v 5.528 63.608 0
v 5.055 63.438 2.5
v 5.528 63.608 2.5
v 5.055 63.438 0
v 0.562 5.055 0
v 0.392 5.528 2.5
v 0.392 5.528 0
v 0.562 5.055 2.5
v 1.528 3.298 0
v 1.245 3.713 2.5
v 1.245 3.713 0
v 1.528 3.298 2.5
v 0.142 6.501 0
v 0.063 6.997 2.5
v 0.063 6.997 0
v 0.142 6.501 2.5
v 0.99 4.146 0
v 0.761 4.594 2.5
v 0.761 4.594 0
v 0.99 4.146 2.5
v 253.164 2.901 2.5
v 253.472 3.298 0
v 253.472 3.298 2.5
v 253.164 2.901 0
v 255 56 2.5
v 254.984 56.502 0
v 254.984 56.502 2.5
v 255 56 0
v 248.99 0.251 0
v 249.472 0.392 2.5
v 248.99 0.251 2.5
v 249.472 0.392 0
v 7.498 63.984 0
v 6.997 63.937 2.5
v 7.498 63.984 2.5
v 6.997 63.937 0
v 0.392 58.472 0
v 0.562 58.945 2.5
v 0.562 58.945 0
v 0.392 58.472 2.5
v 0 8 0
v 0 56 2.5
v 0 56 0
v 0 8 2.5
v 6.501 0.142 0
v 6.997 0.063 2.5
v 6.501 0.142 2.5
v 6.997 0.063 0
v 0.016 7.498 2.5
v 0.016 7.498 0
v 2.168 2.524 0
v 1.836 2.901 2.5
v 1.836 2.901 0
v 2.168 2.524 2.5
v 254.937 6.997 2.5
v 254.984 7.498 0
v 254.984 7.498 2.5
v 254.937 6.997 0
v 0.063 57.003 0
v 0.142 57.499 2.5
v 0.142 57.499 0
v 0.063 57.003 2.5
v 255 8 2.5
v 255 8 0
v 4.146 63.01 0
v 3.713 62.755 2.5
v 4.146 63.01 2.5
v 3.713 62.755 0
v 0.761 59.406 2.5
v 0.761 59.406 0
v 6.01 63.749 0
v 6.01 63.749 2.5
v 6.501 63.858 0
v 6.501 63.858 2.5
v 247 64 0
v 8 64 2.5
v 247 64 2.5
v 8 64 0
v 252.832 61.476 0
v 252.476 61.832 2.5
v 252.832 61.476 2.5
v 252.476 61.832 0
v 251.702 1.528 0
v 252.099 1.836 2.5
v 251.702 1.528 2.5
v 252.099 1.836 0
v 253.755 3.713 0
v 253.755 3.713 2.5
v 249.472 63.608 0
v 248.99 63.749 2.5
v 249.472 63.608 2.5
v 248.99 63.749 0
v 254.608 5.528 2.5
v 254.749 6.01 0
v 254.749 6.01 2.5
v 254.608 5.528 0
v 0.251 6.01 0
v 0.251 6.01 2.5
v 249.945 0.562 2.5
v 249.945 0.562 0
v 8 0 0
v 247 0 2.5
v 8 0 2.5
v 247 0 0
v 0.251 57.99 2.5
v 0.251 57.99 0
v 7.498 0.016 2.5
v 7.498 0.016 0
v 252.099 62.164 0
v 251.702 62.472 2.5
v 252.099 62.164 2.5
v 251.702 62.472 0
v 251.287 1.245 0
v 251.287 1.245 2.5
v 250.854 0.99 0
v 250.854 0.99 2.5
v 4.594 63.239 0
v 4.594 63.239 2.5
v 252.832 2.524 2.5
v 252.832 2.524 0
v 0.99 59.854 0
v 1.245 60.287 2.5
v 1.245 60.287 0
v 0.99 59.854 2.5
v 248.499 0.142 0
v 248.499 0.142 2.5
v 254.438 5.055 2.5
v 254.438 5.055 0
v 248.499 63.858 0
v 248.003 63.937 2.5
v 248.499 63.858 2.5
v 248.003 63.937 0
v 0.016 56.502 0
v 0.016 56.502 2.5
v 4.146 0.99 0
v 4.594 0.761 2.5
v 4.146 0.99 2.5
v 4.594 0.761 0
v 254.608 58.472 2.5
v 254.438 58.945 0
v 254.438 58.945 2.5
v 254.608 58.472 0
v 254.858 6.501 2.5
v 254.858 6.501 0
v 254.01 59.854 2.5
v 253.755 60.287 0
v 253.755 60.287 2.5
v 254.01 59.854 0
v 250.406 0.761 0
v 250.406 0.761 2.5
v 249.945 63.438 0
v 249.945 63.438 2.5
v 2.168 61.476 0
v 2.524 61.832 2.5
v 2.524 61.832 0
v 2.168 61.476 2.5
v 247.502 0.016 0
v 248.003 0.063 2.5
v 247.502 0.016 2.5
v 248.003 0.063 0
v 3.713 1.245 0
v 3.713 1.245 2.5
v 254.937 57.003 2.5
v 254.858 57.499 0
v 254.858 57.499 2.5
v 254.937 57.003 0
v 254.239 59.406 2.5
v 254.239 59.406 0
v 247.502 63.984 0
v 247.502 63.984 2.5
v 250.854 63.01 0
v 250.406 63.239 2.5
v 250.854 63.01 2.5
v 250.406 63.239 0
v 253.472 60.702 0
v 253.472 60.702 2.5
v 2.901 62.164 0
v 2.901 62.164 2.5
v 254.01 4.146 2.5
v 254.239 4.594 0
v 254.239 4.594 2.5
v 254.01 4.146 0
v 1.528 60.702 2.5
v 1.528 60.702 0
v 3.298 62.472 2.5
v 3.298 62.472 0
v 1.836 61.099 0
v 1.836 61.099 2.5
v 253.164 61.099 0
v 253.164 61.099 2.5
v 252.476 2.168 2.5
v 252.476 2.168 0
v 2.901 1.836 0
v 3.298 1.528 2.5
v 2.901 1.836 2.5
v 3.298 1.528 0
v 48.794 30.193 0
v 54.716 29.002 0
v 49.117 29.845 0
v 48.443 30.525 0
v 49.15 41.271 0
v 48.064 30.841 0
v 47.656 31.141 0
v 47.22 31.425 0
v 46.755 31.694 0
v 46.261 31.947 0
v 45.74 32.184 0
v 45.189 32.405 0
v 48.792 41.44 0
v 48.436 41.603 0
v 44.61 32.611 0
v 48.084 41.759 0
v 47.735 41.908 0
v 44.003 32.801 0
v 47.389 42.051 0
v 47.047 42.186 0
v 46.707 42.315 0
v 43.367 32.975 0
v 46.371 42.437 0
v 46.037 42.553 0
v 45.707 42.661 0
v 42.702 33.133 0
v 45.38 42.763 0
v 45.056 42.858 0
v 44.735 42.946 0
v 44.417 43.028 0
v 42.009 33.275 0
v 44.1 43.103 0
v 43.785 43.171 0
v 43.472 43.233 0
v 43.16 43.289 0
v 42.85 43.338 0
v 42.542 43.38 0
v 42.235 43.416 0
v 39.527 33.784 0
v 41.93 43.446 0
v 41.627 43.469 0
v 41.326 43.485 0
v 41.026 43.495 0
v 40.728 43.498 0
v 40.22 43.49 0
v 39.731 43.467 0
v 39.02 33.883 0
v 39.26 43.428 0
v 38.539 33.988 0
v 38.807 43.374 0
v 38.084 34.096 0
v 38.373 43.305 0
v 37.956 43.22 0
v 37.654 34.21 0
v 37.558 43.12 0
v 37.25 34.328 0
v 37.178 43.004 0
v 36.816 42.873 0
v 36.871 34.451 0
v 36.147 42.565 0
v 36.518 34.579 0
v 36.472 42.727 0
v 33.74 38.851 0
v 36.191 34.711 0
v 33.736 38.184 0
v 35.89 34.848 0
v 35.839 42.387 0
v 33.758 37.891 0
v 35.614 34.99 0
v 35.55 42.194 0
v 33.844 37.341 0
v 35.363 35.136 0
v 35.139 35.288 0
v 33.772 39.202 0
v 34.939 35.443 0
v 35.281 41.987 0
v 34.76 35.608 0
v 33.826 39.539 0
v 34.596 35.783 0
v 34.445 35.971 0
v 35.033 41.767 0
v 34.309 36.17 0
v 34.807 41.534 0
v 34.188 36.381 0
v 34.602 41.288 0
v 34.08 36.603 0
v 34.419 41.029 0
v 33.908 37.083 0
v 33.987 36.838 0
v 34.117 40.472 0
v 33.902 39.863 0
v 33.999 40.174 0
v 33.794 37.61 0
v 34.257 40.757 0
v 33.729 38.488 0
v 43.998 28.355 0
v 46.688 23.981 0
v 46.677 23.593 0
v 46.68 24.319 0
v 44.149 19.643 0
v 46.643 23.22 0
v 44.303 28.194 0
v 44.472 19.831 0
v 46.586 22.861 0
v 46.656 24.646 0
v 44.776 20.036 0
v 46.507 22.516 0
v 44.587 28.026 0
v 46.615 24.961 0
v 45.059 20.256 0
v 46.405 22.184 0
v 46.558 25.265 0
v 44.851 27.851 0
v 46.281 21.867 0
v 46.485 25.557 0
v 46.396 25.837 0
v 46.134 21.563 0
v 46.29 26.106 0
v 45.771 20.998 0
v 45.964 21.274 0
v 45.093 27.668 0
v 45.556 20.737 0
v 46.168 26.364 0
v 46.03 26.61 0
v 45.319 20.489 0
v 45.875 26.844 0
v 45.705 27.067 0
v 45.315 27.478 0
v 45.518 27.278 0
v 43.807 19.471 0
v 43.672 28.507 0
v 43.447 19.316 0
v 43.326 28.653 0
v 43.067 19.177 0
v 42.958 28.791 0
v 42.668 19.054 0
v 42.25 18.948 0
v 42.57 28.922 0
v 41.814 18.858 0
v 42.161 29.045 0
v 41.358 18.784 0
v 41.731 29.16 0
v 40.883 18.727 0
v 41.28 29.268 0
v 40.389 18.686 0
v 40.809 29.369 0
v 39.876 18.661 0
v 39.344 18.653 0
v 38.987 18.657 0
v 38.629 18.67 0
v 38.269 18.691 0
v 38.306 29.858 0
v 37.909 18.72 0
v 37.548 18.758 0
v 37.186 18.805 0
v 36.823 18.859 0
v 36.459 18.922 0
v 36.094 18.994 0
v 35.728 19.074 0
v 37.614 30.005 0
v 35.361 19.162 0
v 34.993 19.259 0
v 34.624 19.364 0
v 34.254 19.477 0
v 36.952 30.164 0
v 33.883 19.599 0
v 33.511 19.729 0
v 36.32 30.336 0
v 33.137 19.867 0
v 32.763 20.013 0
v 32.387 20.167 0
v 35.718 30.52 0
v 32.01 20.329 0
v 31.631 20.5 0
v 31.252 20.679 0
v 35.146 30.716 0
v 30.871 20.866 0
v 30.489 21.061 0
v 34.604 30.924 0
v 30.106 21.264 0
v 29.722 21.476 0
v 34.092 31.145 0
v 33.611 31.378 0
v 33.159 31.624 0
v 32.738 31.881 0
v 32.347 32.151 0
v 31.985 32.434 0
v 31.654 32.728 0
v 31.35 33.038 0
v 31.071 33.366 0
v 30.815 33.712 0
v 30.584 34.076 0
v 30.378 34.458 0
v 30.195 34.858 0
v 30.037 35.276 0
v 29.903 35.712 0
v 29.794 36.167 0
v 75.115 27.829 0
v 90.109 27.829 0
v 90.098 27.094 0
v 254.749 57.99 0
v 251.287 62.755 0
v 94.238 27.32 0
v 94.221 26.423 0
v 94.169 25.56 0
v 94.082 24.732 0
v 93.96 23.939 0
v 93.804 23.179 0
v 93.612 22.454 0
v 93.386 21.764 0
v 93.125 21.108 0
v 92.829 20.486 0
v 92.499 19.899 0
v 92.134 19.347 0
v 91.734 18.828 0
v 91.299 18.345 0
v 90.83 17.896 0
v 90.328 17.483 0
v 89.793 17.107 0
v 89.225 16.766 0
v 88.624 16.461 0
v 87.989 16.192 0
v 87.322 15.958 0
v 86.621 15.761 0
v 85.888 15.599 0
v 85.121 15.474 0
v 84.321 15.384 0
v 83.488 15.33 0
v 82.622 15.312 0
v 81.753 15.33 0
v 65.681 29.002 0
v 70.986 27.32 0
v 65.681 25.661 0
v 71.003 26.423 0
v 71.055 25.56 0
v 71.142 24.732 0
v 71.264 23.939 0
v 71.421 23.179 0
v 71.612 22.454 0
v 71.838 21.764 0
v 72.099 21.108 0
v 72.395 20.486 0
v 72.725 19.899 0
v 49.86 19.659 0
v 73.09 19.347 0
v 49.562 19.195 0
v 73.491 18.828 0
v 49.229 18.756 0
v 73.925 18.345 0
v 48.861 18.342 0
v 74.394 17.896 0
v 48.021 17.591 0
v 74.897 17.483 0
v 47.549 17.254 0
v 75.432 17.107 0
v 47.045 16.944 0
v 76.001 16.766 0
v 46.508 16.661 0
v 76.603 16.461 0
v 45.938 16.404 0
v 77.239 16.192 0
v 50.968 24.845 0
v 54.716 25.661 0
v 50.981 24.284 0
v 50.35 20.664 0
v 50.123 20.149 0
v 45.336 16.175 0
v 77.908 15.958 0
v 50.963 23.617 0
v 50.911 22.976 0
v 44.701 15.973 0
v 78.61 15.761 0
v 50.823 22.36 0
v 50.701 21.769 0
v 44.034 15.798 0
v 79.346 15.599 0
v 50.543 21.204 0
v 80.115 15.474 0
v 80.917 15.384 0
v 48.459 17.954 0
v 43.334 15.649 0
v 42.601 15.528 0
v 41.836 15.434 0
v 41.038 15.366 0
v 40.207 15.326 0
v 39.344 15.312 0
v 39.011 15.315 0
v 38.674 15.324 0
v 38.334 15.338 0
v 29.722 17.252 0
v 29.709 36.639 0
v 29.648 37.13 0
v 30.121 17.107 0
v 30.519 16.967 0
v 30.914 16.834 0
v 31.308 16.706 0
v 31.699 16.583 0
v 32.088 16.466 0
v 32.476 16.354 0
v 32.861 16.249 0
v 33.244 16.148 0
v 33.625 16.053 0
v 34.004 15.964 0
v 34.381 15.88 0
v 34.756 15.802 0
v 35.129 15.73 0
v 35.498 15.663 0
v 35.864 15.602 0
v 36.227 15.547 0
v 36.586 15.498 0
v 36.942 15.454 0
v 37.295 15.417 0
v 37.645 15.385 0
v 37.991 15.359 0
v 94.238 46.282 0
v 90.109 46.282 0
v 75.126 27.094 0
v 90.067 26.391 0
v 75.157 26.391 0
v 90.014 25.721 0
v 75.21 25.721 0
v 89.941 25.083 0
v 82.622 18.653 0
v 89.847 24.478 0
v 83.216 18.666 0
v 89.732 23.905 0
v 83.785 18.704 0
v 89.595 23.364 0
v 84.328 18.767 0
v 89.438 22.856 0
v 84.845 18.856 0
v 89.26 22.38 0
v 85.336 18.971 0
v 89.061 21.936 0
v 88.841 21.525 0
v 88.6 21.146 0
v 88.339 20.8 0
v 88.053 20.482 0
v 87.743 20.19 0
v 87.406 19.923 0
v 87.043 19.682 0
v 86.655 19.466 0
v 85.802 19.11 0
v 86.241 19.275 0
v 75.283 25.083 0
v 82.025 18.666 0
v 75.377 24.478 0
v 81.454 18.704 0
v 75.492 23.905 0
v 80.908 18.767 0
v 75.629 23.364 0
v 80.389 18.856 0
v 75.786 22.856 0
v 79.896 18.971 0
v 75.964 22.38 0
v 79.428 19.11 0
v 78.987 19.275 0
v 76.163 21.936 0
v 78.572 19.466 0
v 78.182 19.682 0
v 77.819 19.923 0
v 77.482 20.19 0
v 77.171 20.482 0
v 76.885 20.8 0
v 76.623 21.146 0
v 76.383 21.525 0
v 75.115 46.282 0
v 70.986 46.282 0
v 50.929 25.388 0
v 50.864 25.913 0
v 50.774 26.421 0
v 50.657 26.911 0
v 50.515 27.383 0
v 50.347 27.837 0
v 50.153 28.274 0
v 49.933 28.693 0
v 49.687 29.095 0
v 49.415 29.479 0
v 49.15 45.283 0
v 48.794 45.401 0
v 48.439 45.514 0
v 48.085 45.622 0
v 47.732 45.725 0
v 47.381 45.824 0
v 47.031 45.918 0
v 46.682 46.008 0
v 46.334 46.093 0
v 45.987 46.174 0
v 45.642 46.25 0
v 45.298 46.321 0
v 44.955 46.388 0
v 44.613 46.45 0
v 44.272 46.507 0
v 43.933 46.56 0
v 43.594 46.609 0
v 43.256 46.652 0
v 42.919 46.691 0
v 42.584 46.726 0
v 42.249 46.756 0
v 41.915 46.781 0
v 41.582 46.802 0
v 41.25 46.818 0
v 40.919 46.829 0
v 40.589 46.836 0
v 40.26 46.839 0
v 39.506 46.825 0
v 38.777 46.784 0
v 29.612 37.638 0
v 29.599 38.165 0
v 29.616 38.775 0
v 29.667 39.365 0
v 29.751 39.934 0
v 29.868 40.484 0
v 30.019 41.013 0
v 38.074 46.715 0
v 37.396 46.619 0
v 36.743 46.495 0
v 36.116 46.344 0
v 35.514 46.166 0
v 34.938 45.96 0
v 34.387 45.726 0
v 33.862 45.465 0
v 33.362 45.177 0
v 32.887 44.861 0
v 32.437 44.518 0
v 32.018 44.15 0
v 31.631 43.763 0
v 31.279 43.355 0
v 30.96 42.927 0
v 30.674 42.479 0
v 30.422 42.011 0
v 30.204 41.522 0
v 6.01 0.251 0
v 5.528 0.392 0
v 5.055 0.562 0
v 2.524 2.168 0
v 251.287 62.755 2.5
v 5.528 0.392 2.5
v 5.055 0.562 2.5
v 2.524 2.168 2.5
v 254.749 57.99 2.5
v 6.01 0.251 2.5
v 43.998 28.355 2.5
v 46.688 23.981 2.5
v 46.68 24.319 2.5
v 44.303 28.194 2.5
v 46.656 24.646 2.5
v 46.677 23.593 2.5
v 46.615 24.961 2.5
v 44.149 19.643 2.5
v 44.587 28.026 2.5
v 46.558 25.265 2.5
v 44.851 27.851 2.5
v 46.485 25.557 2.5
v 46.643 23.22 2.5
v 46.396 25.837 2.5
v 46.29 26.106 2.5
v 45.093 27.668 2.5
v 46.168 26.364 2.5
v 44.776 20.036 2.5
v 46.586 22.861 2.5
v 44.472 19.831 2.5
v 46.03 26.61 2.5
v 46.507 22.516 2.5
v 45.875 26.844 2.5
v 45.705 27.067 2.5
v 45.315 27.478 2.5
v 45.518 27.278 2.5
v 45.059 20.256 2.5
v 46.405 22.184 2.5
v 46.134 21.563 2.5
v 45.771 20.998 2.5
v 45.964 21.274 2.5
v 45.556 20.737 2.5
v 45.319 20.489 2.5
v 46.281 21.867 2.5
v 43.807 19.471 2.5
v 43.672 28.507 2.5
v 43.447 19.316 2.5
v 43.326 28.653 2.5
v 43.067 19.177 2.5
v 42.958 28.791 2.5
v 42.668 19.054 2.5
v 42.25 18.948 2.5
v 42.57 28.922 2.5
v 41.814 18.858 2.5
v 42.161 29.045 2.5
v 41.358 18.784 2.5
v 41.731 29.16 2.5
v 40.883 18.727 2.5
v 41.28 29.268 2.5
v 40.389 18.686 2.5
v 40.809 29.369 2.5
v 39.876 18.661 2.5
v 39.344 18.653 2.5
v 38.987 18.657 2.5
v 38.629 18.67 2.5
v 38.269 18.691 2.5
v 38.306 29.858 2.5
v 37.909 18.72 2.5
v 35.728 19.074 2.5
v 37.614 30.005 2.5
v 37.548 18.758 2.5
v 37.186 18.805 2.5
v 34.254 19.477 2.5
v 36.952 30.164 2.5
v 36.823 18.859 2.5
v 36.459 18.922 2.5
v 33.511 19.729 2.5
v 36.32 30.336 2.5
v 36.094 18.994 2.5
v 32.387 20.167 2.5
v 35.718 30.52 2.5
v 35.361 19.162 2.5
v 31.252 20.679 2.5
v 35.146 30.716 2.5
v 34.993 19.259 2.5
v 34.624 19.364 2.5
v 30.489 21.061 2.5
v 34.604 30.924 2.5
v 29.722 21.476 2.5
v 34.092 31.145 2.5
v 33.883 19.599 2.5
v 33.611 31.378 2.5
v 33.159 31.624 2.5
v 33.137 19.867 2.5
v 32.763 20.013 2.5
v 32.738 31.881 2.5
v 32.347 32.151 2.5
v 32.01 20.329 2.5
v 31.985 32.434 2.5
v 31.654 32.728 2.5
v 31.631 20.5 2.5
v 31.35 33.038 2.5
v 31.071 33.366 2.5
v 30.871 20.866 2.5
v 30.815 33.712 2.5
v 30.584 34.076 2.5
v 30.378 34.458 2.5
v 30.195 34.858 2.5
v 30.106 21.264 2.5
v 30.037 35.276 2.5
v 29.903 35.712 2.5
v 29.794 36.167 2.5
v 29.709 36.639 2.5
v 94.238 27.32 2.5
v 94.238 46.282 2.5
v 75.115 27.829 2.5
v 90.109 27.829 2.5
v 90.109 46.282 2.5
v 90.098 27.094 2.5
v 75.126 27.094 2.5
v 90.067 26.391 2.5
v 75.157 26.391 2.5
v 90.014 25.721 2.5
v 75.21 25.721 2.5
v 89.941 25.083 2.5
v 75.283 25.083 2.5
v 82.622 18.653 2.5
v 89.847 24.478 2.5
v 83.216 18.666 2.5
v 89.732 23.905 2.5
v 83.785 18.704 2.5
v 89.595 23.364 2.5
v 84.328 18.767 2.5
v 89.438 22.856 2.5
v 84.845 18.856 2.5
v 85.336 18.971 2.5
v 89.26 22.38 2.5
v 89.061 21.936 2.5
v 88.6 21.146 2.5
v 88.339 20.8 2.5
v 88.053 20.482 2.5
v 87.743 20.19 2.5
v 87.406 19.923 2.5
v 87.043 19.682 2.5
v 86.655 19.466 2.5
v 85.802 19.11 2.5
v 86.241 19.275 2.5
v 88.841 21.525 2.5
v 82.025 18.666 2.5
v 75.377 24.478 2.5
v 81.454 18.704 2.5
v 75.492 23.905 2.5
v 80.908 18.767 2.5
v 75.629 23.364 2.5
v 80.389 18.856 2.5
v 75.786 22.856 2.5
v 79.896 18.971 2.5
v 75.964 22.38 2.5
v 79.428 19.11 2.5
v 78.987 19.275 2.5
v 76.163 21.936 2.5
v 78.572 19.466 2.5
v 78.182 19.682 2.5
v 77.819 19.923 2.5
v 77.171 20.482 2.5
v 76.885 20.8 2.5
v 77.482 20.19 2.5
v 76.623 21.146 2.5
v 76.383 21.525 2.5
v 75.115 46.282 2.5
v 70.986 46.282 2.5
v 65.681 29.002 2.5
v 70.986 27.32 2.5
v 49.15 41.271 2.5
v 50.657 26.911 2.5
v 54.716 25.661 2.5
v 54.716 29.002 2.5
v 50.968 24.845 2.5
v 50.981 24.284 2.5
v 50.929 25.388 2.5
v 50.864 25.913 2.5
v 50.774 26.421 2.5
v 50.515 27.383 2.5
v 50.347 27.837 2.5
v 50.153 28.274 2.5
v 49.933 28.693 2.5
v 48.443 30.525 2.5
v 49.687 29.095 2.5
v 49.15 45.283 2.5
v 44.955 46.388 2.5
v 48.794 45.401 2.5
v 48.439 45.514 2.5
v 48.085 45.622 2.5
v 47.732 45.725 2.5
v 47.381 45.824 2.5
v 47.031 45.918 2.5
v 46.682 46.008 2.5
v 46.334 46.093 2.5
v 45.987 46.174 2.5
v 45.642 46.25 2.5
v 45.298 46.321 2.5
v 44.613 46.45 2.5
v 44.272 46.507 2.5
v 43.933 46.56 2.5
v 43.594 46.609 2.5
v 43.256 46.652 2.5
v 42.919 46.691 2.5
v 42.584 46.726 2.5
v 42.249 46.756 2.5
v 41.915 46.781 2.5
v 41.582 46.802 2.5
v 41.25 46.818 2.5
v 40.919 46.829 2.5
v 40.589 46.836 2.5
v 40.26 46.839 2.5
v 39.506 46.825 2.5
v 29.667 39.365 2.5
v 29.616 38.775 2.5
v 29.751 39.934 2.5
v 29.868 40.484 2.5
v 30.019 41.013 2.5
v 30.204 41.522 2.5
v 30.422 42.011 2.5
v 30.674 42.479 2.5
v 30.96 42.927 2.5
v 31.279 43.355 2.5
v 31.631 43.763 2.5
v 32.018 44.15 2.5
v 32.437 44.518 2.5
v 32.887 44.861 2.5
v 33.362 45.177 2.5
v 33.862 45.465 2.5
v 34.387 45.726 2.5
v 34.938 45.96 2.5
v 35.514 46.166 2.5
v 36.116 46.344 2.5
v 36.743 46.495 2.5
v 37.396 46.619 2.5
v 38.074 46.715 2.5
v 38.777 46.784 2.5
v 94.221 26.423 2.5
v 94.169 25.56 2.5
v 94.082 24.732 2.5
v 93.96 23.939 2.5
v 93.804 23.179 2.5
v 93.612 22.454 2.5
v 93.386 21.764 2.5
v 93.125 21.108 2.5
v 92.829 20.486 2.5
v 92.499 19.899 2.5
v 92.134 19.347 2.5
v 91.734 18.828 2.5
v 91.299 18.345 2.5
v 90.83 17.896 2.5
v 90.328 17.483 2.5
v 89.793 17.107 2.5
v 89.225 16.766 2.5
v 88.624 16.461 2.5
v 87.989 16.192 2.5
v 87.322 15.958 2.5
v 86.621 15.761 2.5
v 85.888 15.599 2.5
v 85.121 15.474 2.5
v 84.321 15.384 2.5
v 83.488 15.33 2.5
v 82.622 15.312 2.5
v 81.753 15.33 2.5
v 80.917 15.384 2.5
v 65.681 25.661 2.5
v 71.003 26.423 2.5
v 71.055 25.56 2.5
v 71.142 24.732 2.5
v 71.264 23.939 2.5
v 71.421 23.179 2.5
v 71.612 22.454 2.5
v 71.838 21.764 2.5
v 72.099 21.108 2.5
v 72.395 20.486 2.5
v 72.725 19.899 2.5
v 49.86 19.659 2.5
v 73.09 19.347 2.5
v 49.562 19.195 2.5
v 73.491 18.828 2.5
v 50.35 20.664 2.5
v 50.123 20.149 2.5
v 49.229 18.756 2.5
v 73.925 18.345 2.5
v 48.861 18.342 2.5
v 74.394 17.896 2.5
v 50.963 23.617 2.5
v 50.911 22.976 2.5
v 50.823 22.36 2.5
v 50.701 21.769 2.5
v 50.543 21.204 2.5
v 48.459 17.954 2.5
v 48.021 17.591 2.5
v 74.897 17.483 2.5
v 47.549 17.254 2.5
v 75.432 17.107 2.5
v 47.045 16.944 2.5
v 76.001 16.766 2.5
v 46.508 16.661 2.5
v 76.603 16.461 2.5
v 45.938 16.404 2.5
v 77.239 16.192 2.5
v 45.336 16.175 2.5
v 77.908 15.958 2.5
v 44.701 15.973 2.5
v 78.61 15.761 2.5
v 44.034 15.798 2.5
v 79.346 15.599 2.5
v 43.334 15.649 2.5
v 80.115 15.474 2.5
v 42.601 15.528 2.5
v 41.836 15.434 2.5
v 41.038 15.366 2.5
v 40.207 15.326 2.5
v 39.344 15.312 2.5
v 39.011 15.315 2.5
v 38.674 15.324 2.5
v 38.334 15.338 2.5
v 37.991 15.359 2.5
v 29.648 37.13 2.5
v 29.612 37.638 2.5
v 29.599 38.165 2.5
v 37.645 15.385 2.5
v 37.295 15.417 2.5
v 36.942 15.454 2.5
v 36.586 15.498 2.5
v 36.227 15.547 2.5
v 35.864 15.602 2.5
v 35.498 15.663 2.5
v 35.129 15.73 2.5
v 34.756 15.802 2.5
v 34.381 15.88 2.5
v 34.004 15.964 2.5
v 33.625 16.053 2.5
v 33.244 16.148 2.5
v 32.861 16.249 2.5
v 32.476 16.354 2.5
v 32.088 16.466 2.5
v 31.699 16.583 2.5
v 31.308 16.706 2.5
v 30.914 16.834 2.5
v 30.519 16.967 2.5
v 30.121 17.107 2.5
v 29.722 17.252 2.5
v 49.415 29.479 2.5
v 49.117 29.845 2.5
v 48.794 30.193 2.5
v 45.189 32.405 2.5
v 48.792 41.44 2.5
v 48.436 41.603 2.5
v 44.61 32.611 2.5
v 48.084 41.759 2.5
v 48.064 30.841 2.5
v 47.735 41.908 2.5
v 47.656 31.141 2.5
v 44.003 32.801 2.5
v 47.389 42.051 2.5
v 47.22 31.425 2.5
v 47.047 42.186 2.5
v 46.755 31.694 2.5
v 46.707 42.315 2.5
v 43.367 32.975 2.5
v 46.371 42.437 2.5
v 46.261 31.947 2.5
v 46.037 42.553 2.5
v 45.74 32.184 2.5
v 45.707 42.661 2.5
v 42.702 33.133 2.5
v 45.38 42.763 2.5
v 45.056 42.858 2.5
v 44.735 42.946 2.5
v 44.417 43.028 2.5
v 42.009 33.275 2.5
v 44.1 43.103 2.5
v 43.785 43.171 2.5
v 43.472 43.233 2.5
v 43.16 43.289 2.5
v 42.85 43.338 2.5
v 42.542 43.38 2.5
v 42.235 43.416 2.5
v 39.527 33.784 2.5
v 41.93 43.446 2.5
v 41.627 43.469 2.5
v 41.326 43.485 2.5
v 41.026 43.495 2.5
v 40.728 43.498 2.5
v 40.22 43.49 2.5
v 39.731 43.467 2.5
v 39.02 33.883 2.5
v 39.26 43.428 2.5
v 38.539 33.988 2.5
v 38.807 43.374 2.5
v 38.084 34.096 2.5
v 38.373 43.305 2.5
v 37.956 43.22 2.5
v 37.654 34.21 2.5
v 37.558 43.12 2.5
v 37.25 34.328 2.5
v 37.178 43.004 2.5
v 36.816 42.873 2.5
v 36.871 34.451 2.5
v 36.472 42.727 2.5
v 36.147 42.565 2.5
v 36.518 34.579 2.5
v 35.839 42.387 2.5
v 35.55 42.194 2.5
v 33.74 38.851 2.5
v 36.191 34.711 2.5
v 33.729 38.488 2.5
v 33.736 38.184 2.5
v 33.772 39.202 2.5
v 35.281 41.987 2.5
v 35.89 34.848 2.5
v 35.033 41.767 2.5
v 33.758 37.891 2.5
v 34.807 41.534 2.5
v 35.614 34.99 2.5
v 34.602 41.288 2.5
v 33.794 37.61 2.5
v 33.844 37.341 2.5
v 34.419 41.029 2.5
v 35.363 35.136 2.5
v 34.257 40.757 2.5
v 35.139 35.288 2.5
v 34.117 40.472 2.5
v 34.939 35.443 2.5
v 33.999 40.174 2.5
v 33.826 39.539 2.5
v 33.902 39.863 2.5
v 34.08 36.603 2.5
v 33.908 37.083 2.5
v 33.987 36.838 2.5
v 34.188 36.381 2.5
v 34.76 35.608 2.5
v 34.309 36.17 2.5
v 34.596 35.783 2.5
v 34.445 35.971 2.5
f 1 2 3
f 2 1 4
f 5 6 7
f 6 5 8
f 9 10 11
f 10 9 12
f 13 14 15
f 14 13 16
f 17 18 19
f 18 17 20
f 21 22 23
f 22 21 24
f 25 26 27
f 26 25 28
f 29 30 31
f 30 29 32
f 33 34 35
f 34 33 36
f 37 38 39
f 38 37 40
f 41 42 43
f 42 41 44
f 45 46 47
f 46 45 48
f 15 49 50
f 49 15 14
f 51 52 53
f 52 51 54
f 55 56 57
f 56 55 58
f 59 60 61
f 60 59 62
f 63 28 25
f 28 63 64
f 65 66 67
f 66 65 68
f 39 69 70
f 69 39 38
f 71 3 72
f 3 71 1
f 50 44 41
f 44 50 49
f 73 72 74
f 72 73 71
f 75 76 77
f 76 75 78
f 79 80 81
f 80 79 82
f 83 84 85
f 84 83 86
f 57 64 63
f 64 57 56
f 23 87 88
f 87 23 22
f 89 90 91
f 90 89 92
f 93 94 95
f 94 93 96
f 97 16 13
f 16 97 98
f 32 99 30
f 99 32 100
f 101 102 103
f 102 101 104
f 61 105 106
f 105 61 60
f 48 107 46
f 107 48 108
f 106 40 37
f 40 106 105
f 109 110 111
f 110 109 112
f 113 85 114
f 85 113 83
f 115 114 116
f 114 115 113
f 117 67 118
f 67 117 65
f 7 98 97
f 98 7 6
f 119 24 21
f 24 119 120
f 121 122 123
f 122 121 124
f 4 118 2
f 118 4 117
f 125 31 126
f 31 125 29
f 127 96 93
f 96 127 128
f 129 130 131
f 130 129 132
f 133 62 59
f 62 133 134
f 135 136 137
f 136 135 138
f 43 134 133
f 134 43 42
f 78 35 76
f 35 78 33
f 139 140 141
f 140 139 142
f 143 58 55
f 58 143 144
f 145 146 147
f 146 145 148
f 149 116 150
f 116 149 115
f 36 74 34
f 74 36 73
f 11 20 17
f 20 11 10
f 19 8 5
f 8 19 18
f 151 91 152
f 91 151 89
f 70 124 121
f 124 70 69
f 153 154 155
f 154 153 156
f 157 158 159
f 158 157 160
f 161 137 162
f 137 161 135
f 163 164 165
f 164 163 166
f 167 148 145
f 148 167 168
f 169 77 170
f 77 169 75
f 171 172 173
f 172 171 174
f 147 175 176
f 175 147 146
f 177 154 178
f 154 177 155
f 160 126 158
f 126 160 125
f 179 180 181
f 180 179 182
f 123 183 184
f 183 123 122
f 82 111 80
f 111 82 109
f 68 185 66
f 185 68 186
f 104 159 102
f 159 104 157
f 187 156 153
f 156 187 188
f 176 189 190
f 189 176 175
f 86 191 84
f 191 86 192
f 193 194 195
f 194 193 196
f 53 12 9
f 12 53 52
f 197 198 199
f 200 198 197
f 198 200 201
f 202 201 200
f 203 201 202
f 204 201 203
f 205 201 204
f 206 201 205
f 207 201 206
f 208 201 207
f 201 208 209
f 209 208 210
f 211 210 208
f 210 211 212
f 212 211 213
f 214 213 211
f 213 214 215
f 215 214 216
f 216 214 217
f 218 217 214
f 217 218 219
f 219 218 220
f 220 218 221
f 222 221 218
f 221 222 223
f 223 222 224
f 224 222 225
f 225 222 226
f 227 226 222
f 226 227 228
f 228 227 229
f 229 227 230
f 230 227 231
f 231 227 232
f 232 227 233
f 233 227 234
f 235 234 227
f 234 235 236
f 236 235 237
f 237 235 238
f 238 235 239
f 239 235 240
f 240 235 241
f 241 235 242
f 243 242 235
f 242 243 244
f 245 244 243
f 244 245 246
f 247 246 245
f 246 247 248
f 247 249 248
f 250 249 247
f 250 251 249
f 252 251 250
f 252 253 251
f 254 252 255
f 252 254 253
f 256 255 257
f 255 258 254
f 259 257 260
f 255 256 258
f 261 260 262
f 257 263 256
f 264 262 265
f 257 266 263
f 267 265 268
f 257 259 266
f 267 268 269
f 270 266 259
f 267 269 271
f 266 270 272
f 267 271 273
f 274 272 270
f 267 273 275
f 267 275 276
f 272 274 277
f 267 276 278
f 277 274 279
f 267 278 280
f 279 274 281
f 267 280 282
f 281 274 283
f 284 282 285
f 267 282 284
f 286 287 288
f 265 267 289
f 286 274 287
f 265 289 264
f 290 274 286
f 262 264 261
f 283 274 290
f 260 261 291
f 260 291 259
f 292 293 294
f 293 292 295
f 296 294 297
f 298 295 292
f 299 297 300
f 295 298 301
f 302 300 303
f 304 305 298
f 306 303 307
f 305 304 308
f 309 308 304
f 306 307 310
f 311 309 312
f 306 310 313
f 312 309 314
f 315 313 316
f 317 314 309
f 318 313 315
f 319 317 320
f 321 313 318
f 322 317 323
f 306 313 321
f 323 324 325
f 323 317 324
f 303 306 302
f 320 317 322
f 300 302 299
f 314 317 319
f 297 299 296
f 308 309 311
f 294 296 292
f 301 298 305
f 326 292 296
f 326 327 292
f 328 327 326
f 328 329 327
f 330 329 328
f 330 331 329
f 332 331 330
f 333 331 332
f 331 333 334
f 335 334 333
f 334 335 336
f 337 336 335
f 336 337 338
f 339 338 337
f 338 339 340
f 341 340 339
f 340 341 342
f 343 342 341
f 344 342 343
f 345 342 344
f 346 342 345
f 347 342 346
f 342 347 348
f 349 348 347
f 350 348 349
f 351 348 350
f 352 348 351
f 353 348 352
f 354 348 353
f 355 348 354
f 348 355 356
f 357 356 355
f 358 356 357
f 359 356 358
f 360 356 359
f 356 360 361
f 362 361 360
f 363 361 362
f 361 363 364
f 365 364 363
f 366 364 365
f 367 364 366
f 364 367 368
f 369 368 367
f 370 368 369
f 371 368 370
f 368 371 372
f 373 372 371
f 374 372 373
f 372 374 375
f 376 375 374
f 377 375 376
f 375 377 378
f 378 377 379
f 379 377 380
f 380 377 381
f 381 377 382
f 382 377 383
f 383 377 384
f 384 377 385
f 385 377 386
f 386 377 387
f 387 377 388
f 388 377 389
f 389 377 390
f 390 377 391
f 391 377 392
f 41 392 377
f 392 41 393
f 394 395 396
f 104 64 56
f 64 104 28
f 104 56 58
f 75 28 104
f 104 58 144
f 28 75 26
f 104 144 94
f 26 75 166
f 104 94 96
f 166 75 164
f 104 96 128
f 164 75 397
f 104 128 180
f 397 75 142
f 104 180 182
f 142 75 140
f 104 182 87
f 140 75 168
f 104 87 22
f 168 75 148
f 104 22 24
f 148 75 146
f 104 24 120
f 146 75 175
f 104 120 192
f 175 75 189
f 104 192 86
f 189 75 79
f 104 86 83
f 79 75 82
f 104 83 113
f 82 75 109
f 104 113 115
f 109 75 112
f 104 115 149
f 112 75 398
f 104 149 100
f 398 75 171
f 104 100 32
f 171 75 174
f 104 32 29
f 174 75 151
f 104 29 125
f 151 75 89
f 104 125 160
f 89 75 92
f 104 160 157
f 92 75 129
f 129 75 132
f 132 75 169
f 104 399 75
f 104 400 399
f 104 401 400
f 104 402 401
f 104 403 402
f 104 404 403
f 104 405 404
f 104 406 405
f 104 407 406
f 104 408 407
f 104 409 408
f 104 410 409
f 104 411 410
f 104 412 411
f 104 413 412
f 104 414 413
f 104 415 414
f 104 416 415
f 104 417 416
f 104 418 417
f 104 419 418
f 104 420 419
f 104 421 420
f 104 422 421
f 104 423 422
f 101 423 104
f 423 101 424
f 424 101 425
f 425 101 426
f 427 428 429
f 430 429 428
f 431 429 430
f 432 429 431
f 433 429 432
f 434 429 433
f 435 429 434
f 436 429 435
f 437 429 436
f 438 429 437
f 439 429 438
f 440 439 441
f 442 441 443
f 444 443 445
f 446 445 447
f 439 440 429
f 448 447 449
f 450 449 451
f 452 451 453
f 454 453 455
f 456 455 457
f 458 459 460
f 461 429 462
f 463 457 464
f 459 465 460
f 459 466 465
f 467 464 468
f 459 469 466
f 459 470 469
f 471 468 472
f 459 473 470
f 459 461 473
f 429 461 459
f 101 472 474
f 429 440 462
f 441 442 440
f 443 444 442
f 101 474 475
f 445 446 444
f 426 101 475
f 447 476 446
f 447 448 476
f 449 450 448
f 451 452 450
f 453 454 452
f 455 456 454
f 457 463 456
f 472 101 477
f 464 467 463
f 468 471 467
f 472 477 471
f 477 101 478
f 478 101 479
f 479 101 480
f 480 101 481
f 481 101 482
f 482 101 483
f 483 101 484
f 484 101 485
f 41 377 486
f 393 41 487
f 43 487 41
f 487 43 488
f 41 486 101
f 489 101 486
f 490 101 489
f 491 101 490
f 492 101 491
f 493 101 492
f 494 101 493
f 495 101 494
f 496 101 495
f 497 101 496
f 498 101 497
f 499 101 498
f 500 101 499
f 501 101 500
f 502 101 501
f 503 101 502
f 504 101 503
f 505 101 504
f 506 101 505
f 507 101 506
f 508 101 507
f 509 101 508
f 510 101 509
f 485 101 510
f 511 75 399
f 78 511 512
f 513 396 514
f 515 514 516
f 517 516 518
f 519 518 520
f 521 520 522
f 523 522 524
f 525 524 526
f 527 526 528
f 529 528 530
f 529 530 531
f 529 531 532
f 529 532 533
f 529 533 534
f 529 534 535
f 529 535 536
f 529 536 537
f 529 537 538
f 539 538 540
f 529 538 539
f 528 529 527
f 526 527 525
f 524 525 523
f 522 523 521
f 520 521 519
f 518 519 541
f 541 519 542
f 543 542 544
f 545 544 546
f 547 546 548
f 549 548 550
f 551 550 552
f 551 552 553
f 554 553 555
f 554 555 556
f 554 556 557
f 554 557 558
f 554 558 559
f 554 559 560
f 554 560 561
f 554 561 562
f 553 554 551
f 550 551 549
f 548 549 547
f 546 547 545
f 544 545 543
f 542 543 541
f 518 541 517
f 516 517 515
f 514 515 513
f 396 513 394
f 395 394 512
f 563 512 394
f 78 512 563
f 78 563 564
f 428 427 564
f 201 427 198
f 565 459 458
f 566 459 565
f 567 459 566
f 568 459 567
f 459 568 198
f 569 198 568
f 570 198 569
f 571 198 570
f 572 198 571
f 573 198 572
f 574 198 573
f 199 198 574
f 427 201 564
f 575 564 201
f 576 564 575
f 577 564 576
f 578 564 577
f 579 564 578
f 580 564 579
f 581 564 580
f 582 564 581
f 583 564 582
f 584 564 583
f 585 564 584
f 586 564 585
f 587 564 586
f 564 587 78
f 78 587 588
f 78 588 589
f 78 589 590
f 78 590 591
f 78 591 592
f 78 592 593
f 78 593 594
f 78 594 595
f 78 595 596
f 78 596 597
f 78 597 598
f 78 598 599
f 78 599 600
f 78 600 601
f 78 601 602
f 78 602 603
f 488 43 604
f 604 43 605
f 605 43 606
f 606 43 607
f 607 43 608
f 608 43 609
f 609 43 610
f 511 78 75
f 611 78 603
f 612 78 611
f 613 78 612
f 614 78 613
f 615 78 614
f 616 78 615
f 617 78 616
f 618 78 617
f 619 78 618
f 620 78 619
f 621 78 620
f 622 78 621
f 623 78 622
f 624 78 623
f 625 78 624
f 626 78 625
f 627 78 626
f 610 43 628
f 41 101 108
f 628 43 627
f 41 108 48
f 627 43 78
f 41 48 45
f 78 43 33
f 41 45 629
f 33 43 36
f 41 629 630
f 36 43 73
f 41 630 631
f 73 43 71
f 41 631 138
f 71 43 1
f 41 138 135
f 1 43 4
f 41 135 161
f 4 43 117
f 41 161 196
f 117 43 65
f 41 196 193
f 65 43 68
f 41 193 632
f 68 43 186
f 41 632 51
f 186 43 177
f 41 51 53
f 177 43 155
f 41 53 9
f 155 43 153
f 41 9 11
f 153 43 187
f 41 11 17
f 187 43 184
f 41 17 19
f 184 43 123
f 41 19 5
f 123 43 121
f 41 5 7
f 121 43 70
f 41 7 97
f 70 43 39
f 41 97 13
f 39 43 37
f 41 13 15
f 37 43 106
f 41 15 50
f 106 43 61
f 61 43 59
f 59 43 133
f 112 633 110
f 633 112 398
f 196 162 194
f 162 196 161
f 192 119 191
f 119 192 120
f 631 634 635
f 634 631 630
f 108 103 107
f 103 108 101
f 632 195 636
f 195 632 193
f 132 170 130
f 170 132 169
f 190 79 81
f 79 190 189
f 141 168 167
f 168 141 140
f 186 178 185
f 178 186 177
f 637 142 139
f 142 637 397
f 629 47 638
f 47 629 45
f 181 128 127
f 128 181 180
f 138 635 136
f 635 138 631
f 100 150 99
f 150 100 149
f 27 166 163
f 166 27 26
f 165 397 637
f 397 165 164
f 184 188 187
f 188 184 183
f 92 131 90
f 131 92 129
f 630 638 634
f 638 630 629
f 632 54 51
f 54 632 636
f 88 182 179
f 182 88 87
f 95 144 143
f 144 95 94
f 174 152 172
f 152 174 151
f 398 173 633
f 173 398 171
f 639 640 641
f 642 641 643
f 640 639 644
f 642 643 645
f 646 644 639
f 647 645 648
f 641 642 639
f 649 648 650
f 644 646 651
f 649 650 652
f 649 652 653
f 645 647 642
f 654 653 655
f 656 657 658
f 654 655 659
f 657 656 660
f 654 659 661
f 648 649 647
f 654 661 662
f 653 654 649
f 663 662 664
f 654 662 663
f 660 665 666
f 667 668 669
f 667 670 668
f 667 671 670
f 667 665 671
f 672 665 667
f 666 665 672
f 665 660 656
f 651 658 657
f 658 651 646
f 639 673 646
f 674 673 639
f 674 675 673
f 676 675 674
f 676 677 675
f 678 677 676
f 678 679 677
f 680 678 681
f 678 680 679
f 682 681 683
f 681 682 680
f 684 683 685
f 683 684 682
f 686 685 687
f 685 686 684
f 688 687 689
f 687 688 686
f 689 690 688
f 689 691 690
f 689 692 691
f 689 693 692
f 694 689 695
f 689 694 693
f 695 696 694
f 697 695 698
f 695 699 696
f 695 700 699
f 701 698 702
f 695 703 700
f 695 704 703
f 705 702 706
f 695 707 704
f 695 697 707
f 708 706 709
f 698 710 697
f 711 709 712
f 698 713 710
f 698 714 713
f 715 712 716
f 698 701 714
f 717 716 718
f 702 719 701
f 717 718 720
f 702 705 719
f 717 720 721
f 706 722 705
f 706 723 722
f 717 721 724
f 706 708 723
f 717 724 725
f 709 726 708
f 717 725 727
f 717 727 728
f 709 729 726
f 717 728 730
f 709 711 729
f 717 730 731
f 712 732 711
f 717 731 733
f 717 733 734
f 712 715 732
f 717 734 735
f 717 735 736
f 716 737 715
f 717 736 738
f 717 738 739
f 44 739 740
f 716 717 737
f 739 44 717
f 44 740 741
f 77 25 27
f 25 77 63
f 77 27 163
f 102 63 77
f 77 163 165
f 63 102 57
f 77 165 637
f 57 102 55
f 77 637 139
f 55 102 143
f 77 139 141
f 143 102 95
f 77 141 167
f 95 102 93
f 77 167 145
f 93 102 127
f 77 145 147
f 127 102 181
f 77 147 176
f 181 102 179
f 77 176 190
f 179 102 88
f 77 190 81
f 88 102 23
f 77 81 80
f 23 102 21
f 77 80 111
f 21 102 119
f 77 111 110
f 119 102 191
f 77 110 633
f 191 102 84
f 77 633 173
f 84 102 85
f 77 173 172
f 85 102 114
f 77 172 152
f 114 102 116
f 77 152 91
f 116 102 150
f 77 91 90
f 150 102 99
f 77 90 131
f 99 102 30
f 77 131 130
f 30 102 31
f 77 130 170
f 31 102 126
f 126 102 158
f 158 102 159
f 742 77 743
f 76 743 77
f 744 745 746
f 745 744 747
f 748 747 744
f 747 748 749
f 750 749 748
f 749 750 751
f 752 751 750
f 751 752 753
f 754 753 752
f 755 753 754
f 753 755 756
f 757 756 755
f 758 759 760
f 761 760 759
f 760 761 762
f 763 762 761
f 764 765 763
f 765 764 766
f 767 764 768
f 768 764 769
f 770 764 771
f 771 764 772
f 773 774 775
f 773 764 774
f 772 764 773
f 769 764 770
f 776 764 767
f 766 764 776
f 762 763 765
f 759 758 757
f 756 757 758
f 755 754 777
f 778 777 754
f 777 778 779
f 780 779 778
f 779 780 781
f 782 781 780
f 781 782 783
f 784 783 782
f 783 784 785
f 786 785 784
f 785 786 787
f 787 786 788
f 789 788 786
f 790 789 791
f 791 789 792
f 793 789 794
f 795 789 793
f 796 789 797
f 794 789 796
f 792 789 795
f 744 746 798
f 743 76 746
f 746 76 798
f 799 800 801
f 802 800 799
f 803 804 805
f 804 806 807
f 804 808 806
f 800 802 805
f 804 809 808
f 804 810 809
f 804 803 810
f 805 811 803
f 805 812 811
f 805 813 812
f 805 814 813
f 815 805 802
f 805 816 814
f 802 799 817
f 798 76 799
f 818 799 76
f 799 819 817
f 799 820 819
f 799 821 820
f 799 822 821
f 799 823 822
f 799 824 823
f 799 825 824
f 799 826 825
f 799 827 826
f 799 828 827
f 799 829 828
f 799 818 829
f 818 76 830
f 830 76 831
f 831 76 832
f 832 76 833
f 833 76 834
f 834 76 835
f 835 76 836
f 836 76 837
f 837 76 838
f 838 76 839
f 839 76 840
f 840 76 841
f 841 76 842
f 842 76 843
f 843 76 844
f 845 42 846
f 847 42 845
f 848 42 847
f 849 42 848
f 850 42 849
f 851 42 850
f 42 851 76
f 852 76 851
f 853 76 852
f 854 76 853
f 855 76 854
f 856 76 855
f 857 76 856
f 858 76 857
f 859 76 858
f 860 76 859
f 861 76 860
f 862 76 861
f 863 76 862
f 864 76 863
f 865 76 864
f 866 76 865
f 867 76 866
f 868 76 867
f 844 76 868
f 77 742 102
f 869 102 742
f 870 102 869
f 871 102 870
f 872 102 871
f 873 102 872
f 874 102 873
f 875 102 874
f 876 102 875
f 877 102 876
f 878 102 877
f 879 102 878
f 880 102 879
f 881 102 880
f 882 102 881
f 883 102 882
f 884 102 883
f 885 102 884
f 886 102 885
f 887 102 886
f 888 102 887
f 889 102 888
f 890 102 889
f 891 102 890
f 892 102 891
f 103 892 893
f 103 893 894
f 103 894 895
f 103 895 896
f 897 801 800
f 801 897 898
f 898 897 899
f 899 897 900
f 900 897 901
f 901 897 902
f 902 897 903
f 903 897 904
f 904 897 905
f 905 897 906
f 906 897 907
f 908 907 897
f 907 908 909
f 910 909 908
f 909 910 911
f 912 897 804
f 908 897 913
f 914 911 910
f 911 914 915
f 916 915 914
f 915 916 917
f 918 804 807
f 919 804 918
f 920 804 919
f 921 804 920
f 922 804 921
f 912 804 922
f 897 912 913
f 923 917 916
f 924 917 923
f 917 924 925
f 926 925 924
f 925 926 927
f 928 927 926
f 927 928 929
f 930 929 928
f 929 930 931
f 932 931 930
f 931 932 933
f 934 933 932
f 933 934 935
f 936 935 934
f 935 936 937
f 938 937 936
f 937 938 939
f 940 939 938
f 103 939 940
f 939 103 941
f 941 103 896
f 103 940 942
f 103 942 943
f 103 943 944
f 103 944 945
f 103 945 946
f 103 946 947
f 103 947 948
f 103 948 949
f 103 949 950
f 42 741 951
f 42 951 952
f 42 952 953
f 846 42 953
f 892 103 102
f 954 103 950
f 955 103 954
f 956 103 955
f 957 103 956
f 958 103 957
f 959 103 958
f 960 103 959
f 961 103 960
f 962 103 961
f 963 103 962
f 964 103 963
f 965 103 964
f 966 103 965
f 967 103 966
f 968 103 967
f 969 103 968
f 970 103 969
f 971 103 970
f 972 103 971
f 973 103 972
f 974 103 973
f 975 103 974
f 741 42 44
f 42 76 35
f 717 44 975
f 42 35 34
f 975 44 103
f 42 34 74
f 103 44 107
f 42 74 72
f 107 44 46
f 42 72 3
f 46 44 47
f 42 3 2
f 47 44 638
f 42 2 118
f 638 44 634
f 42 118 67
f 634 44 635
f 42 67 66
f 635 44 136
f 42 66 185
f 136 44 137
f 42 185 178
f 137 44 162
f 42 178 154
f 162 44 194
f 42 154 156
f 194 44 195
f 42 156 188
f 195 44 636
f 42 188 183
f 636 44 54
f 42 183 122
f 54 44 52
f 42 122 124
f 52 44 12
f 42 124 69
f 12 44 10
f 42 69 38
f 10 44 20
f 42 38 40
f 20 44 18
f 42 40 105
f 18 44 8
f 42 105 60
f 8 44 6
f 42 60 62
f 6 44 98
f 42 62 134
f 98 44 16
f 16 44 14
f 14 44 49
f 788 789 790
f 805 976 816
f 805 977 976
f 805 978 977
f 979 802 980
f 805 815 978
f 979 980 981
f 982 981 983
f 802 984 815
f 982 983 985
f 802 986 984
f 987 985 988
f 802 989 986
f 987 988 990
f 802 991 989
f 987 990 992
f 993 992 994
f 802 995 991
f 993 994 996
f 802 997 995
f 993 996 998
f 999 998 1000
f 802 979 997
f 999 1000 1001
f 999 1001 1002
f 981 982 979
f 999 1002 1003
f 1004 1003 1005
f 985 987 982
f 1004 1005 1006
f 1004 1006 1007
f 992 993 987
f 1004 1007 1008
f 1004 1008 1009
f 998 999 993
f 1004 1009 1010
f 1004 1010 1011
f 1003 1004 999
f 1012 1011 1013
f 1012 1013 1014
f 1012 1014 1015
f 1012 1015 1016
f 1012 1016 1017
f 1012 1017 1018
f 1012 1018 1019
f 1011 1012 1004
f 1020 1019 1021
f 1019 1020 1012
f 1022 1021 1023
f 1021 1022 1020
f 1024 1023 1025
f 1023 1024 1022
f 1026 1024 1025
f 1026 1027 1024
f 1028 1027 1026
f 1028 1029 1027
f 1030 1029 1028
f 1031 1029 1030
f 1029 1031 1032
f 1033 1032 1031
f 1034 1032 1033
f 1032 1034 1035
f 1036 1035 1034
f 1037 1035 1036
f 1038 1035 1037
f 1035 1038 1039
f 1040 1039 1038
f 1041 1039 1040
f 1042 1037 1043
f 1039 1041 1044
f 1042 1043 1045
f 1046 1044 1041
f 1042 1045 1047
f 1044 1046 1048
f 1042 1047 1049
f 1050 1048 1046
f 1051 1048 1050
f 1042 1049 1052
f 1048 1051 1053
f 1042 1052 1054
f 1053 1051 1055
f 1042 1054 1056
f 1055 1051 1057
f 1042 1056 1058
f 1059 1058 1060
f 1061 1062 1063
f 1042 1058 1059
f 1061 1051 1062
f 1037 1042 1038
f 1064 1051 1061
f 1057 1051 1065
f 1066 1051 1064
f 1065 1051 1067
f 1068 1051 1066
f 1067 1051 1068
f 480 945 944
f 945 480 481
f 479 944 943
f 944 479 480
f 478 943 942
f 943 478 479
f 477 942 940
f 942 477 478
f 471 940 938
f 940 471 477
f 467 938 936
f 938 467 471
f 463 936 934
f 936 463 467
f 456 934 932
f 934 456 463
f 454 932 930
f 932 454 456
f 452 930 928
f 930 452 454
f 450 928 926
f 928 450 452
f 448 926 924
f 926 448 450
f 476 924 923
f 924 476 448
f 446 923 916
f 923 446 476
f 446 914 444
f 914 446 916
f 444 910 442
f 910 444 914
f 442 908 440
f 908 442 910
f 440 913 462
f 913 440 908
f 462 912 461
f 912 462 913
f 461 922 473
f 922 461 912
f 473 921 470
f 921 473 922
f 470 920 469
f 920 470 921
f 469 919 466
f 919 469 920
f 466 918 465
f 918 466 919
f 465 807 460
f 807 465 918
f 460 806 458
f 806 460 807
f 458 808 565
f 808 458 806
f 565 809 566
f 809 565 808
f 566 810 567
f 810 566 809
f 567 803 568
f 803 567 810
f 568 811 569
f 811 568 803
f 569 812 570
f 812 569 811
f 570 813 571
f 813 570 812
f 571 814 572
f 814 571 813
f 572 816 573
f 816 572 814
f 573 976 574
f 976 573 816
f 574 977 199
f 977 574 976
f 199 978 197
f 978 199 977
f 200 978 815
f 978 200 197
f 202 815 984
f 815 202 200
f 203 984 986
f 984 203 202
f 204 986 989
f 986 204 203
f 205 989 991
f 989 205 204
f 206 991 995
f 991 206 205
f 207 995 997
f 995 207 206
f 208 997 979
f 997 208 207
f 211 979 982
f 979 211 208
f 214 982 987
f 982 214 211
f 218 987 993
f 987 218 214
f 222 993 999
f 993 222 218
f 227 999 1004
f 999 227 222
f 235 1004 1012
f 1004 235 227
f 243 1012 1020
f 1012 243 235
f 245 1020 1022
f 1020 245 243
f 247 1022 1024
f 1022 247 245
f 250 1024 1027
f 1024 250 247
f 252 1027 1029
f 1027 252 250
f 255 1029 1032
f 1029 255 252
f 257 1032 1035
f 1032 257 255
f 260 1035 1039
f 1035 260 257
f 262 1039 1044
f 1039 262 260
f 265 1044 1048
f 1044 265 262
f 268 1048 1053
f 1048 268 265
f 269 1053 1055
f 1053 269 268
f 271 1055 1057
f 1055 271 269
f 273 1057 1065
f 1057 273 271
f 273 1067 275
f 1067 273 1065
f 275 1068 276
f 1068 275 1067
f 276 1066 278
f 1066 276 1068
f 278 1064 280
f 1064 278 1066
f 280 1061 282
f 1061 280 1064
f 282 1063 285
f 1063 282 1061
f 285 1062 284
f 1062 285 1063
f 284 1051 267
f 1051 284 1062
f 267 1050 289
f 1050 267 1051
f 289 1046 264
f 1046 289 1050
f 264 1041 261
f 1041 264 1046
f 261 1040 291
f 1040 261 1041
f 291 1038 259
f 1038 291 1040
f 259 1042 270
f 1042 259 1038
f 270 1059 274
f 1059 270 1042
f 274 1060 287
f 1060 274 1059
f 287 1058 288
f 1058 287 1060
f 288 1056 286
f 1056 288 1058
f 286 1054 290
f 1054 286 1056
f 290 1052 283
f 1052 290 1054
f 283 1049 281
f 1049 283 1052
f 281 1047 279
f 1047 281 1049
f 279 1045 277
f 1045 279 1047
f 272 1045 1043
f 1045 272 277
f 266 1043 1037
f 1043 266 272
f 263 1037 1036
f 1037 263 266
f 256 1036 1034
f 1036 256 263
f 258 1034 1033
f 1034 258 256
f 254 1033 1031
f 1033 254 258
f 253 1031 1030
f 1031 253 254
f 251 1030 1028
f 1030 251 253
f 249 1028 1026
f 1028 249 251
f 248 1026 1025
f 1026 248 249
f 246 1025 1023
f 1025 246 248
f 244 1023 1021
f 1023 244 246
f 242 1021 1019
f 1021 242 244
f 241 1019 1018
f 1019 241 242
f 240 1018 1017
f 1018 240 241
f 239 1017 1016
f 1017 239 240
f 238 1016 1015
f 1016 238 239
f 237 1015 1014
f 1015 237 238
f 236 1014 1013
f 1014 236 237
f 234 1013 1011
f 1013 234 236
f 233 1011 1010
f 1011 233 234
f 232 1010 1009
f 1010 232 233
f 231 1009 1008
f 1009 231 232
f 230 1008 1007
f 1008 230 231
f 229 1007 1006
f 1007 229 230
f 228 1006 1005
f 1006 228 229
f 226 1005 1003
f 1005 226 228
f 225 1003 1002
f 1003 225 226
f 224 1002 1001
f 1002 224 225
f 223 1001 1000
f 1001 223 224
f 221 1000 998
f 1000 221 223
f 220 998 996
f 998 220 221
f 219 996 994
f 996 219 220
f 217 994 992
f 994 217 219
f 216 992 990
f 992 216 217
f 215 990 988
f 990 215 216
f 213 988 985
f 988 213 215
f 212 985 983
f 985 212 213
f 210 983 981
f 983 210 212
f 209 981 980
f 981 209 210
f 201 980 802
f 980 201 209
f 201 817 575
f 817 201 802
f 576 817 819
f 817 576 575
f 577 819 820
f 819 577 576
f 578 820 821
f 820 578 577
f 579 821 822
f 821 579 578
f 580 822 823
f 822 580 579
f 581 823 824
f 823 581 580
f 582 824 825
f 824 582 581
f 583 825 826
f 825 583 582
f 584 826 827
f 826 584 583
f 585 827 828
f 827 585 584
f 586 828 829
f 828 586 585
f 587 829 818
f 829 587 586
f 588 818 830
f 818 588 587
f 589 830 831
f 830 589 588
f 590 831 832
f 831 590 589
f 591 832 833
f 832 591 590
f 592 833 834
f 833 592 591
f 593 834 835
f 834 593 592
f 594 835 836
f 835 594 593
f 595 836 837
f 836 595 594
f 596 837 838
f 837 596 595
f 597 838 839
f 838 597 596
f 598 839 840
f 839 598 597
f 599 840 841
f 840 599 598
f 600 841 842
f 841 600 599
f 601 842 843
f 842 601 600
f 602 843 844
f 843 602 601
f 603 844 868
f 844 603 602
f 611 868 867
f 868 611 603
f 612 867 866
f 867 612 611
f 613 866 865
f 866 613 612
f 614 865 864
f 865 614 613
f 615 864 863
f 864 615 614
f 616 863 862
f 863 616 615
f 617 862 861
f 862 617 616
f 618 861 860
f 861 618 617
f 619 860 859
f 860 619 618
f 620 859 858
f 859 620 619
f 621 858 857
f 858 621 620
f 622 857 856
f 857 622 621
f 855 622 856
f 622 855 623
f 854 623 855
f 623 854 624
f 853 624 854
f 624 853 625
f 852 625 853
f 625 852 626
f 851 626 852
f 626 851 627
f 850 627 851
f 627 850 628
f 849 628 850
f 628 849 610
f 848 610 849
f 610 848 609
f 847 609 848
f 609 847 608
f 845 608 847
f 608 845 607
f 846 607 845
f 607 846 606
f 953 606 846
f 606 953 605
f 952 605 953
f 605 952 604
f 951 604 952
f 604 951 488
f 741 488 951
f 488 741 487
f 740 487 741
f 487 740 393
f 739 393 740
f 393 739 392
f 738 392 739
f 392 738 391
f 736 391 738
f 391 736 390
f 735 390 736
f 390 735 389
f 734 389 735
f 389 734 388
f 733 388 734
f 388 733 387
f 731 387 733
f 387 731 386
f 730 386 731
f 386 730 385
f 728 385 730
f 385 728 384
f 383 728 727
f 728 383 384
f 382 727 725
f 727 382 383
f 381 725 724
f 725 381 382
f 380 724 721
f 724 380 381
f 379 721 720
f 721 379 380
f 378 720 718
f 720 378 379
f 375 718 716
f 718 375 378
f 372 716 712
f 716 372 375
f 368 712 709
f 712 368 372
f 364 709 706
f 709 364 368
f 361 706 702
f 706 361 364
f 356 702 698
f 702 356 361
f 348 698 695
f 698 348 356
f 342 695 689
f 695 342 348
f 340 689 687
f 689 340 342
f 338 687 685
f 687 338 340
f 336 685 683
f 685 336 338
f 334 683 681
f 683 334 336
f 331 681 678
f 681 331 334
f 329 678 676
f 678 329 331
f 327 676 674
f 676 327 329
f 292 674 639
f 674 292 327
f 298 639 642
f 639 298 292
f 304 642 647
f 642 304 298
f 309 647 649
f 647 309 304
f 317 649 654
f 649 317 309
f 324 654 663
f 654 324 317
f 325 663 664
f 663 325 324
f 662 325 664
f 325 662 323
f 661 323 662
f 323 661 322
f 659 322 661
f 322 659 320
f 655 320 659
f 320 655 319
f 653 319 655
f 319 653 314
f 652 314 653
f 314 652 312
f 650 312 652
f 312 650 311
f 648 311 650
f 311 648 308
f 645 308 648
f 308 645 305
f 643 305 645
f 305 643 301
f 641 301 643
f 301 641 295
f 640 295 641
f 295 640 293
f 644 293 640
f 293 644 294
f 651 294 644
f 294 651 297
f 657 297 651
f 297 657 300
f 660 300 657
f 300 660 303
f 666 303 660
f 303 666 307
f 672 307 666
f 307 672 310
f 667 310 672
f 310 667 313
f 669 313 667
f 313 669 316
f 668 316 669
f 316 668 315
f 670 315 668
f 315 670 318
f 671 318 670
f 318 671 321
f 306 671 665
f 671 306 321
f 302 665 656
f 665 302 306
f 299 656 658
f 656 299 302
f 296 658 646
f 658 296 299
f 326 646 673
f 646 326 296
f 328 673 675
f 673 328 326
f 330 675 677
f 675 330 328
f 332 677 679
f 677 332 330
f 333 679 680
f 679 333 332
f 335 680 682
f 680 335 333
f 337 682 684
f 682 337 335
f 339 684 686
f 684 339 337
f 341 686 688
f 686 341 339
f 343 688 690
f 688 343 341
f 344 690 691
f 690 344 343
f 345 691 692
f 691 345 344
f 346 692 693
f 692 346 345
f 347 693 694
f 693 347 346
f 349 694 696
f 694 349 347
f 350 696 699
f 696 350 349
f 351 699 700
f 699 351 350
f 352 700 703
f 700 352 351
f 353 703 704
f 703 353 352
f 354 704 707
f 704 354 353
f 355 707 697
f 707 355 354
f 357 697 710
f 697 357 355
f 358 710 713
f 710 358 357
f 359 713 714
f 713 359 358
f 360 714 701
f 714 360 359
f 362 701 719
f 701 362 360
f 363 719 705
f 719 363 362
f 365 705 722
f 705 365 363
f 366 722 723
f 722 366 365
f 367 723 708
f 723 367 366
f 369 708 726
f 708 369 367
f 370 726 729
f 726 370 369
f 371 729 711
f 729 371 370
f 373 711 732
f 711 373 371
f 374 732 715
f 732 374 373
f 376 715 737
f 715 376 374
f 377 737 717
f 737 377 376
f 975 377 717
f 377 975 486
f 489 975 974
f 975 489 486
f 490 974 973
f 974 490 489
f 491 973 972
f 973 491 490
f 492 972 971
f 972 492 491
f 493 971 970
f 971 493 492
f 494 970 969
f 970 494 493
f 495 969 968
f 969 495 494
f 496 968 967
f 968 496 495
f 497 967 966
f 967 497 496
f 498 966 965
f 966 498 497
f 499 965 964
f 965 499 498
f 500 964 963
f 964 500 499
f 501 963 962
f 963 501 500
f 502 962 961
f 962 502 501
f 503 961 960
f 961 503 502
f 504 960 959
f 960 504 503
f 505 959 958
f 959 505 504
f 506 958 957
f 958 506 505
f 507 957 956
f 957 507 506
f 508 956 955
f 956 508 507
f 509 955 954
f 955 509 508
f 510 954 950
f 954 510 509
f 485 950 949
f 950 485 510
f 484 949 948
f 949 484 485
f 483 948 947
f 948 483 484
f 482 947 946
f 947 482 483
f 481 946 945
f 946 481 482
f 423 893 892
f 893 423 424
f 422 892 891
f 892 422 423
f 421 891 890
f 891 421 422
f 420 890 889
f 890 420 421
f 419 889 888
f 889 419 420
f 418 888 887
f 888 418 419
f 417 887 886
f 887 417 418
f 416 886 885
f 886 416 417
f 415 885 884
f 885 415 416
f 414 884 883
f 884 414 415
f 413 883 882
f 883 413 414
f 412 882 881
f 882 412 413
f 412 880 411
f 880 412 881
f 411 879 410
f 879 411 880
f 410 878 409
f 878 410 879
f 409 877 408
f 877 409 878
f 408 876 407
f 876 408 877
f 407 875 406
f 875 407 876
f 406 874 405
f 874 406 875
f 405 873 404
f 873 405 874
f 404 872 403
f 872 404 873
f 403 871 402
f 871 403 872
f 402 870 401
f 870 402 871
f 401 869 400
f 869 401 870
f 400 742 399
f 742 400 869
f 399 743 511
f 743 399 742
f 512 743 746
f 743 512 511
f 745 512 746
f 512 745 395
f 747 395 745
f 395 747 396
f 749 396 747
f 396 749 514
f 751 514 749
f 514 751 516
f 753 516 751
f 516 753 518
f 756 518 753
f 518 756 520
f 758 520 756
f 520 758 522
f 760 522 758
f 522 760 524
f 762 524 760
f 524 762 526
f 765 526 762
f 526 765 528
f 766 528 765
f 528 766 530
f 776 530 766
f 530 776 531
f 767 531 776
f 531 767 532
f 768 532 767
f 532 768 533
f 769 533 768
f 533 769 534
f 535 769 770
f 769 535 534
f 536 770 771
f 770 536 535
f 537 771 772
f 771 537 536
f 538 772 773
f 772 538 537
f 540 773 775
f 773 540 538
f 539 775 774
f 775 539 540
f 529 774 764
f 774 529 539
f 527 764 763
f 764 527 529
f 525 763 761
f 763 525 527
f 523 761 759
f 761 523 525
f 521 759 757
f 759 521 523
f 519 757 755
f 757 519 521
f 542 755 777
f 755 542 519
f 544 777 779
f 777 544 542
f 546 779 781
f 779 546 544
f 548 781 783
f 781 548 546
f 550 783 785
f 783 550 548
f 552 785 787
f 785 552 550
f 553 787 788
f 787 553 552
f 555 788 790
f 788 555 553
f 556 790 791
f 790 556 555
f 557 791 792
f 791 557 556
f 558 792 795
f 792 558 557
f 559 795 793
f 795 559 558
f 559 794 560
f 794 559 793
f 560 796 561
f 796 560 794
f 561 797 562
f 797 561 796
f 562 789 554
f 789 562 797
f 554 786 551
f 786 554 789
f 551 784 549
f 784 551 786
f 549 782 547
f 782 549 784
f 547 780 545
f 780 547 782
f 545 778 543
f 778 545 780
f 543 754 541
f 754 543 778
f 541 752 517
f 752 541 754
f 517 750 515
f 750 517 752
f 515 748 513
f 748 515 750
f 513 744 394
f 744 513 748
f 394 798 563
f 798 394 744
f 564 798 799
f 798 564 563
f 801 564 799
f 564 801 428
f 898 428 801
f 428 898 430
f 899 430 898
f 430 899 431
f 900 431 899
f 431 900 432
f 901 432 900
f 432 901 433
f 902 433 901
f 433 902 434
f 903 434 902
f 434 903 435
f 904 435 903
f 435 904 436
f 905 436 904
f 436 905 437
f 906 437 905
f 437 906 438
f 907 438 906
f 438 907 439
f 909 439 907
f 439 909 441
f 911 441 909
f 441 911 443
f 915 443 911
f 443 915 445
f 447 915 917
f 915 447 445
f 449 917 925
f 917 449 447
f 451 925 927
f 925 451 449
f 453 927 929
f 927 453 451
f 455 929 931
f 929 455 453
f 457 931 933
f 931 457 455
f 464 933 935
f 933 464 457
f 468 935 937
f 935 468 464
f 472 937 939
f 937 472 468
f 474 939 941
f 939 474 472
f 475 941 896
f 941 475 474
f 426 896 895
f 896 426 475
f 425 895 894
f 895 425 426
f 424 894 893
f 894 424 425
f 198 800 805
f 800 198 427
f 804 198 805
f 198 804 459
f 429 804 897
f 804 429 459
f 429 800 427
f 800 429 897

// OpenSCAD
$fn = $preview ? 15 : 100;
EPSILON = 0.01;

BORDER_RADIUS = 8;
FULL_WIDTH = 255;
PLATE_THICKNESS = 2.5;
TAB_HEIGHT = 64;
// TAB_WIDTH = 122;
TAB_WIDTH = 124;
FONT_SIZE = 30;

letter = "S-U";
level = 1;

module draw_letter(letter) {
  linear_extrude(height = PLATE_THICKNESS + EPSILON)
      text(text = letter, font = "Lintsec:style=Regular", size = FONT_SIZE,
           halign = "center", valign = "center");
}

difference() {
  union() {
    translate([ 0, 0, 0 ])
        hull() for (x = [ BORDER_RADIUS, FULL_WIDTH - BORDER_RADIUS ]) {
      for (y = [ BORDER_RADIUS, TAB_HEIGHT * level - BORDER_RADIUS ]) {
        translate([ x, y, 0 ]) cylinder(h = PLATE_THICKNESS, r = BORDER_RADIUS);
      }
    }
  }

  // translate(
  //     [ TAB_WIDTH - BORDER_RADIUS, TAB_HEIGHT + BORDER_RADIUS, -EPSILON /
  //     ]) cylinder(h = PLATE_THICKNESS + EPSILON, r = BORDER_RADIUS);

  translate([
    TAB_WIDTH / 2, TAB_HEIGHT / 2 * 0.96 + (TAB_HEIGHT * (level - 1)),
    -EPSILON / 2
  ]) draw_letter(letter);
  // translate([
  //   FULL_WIDTH - (TAB_WIDTH / 2),
  //   TAB_HEIGHT / 2 * 0.96 + (TAB_HEIGHT * (level - 1)), -EPSILON / 2
  // ]) mirror([ 1, 0, 0 ]) draw_letter(letter);

  // translate([ TAB_WIDTH, TAB_HEIGHT, -EPSILON / 2 ])
  //     hull() for (x = [
  //                   BORDER_RADIUS, FULL_WIDTH - BORDER_RADIUS - TAB_WIDTH * 2
  //                 ]) {
  //   for (y = [ BORDER_RADIUS, TAB_HEIGHT * (level - 1) + BORDER_RADIUS ]) {
  //     translate([ x, y, 0 ])
  //         cylinder(h = PLATE_THICKNESS + EPSILON, r = BORDER_RADIUS);
  //   }
  // }
}
